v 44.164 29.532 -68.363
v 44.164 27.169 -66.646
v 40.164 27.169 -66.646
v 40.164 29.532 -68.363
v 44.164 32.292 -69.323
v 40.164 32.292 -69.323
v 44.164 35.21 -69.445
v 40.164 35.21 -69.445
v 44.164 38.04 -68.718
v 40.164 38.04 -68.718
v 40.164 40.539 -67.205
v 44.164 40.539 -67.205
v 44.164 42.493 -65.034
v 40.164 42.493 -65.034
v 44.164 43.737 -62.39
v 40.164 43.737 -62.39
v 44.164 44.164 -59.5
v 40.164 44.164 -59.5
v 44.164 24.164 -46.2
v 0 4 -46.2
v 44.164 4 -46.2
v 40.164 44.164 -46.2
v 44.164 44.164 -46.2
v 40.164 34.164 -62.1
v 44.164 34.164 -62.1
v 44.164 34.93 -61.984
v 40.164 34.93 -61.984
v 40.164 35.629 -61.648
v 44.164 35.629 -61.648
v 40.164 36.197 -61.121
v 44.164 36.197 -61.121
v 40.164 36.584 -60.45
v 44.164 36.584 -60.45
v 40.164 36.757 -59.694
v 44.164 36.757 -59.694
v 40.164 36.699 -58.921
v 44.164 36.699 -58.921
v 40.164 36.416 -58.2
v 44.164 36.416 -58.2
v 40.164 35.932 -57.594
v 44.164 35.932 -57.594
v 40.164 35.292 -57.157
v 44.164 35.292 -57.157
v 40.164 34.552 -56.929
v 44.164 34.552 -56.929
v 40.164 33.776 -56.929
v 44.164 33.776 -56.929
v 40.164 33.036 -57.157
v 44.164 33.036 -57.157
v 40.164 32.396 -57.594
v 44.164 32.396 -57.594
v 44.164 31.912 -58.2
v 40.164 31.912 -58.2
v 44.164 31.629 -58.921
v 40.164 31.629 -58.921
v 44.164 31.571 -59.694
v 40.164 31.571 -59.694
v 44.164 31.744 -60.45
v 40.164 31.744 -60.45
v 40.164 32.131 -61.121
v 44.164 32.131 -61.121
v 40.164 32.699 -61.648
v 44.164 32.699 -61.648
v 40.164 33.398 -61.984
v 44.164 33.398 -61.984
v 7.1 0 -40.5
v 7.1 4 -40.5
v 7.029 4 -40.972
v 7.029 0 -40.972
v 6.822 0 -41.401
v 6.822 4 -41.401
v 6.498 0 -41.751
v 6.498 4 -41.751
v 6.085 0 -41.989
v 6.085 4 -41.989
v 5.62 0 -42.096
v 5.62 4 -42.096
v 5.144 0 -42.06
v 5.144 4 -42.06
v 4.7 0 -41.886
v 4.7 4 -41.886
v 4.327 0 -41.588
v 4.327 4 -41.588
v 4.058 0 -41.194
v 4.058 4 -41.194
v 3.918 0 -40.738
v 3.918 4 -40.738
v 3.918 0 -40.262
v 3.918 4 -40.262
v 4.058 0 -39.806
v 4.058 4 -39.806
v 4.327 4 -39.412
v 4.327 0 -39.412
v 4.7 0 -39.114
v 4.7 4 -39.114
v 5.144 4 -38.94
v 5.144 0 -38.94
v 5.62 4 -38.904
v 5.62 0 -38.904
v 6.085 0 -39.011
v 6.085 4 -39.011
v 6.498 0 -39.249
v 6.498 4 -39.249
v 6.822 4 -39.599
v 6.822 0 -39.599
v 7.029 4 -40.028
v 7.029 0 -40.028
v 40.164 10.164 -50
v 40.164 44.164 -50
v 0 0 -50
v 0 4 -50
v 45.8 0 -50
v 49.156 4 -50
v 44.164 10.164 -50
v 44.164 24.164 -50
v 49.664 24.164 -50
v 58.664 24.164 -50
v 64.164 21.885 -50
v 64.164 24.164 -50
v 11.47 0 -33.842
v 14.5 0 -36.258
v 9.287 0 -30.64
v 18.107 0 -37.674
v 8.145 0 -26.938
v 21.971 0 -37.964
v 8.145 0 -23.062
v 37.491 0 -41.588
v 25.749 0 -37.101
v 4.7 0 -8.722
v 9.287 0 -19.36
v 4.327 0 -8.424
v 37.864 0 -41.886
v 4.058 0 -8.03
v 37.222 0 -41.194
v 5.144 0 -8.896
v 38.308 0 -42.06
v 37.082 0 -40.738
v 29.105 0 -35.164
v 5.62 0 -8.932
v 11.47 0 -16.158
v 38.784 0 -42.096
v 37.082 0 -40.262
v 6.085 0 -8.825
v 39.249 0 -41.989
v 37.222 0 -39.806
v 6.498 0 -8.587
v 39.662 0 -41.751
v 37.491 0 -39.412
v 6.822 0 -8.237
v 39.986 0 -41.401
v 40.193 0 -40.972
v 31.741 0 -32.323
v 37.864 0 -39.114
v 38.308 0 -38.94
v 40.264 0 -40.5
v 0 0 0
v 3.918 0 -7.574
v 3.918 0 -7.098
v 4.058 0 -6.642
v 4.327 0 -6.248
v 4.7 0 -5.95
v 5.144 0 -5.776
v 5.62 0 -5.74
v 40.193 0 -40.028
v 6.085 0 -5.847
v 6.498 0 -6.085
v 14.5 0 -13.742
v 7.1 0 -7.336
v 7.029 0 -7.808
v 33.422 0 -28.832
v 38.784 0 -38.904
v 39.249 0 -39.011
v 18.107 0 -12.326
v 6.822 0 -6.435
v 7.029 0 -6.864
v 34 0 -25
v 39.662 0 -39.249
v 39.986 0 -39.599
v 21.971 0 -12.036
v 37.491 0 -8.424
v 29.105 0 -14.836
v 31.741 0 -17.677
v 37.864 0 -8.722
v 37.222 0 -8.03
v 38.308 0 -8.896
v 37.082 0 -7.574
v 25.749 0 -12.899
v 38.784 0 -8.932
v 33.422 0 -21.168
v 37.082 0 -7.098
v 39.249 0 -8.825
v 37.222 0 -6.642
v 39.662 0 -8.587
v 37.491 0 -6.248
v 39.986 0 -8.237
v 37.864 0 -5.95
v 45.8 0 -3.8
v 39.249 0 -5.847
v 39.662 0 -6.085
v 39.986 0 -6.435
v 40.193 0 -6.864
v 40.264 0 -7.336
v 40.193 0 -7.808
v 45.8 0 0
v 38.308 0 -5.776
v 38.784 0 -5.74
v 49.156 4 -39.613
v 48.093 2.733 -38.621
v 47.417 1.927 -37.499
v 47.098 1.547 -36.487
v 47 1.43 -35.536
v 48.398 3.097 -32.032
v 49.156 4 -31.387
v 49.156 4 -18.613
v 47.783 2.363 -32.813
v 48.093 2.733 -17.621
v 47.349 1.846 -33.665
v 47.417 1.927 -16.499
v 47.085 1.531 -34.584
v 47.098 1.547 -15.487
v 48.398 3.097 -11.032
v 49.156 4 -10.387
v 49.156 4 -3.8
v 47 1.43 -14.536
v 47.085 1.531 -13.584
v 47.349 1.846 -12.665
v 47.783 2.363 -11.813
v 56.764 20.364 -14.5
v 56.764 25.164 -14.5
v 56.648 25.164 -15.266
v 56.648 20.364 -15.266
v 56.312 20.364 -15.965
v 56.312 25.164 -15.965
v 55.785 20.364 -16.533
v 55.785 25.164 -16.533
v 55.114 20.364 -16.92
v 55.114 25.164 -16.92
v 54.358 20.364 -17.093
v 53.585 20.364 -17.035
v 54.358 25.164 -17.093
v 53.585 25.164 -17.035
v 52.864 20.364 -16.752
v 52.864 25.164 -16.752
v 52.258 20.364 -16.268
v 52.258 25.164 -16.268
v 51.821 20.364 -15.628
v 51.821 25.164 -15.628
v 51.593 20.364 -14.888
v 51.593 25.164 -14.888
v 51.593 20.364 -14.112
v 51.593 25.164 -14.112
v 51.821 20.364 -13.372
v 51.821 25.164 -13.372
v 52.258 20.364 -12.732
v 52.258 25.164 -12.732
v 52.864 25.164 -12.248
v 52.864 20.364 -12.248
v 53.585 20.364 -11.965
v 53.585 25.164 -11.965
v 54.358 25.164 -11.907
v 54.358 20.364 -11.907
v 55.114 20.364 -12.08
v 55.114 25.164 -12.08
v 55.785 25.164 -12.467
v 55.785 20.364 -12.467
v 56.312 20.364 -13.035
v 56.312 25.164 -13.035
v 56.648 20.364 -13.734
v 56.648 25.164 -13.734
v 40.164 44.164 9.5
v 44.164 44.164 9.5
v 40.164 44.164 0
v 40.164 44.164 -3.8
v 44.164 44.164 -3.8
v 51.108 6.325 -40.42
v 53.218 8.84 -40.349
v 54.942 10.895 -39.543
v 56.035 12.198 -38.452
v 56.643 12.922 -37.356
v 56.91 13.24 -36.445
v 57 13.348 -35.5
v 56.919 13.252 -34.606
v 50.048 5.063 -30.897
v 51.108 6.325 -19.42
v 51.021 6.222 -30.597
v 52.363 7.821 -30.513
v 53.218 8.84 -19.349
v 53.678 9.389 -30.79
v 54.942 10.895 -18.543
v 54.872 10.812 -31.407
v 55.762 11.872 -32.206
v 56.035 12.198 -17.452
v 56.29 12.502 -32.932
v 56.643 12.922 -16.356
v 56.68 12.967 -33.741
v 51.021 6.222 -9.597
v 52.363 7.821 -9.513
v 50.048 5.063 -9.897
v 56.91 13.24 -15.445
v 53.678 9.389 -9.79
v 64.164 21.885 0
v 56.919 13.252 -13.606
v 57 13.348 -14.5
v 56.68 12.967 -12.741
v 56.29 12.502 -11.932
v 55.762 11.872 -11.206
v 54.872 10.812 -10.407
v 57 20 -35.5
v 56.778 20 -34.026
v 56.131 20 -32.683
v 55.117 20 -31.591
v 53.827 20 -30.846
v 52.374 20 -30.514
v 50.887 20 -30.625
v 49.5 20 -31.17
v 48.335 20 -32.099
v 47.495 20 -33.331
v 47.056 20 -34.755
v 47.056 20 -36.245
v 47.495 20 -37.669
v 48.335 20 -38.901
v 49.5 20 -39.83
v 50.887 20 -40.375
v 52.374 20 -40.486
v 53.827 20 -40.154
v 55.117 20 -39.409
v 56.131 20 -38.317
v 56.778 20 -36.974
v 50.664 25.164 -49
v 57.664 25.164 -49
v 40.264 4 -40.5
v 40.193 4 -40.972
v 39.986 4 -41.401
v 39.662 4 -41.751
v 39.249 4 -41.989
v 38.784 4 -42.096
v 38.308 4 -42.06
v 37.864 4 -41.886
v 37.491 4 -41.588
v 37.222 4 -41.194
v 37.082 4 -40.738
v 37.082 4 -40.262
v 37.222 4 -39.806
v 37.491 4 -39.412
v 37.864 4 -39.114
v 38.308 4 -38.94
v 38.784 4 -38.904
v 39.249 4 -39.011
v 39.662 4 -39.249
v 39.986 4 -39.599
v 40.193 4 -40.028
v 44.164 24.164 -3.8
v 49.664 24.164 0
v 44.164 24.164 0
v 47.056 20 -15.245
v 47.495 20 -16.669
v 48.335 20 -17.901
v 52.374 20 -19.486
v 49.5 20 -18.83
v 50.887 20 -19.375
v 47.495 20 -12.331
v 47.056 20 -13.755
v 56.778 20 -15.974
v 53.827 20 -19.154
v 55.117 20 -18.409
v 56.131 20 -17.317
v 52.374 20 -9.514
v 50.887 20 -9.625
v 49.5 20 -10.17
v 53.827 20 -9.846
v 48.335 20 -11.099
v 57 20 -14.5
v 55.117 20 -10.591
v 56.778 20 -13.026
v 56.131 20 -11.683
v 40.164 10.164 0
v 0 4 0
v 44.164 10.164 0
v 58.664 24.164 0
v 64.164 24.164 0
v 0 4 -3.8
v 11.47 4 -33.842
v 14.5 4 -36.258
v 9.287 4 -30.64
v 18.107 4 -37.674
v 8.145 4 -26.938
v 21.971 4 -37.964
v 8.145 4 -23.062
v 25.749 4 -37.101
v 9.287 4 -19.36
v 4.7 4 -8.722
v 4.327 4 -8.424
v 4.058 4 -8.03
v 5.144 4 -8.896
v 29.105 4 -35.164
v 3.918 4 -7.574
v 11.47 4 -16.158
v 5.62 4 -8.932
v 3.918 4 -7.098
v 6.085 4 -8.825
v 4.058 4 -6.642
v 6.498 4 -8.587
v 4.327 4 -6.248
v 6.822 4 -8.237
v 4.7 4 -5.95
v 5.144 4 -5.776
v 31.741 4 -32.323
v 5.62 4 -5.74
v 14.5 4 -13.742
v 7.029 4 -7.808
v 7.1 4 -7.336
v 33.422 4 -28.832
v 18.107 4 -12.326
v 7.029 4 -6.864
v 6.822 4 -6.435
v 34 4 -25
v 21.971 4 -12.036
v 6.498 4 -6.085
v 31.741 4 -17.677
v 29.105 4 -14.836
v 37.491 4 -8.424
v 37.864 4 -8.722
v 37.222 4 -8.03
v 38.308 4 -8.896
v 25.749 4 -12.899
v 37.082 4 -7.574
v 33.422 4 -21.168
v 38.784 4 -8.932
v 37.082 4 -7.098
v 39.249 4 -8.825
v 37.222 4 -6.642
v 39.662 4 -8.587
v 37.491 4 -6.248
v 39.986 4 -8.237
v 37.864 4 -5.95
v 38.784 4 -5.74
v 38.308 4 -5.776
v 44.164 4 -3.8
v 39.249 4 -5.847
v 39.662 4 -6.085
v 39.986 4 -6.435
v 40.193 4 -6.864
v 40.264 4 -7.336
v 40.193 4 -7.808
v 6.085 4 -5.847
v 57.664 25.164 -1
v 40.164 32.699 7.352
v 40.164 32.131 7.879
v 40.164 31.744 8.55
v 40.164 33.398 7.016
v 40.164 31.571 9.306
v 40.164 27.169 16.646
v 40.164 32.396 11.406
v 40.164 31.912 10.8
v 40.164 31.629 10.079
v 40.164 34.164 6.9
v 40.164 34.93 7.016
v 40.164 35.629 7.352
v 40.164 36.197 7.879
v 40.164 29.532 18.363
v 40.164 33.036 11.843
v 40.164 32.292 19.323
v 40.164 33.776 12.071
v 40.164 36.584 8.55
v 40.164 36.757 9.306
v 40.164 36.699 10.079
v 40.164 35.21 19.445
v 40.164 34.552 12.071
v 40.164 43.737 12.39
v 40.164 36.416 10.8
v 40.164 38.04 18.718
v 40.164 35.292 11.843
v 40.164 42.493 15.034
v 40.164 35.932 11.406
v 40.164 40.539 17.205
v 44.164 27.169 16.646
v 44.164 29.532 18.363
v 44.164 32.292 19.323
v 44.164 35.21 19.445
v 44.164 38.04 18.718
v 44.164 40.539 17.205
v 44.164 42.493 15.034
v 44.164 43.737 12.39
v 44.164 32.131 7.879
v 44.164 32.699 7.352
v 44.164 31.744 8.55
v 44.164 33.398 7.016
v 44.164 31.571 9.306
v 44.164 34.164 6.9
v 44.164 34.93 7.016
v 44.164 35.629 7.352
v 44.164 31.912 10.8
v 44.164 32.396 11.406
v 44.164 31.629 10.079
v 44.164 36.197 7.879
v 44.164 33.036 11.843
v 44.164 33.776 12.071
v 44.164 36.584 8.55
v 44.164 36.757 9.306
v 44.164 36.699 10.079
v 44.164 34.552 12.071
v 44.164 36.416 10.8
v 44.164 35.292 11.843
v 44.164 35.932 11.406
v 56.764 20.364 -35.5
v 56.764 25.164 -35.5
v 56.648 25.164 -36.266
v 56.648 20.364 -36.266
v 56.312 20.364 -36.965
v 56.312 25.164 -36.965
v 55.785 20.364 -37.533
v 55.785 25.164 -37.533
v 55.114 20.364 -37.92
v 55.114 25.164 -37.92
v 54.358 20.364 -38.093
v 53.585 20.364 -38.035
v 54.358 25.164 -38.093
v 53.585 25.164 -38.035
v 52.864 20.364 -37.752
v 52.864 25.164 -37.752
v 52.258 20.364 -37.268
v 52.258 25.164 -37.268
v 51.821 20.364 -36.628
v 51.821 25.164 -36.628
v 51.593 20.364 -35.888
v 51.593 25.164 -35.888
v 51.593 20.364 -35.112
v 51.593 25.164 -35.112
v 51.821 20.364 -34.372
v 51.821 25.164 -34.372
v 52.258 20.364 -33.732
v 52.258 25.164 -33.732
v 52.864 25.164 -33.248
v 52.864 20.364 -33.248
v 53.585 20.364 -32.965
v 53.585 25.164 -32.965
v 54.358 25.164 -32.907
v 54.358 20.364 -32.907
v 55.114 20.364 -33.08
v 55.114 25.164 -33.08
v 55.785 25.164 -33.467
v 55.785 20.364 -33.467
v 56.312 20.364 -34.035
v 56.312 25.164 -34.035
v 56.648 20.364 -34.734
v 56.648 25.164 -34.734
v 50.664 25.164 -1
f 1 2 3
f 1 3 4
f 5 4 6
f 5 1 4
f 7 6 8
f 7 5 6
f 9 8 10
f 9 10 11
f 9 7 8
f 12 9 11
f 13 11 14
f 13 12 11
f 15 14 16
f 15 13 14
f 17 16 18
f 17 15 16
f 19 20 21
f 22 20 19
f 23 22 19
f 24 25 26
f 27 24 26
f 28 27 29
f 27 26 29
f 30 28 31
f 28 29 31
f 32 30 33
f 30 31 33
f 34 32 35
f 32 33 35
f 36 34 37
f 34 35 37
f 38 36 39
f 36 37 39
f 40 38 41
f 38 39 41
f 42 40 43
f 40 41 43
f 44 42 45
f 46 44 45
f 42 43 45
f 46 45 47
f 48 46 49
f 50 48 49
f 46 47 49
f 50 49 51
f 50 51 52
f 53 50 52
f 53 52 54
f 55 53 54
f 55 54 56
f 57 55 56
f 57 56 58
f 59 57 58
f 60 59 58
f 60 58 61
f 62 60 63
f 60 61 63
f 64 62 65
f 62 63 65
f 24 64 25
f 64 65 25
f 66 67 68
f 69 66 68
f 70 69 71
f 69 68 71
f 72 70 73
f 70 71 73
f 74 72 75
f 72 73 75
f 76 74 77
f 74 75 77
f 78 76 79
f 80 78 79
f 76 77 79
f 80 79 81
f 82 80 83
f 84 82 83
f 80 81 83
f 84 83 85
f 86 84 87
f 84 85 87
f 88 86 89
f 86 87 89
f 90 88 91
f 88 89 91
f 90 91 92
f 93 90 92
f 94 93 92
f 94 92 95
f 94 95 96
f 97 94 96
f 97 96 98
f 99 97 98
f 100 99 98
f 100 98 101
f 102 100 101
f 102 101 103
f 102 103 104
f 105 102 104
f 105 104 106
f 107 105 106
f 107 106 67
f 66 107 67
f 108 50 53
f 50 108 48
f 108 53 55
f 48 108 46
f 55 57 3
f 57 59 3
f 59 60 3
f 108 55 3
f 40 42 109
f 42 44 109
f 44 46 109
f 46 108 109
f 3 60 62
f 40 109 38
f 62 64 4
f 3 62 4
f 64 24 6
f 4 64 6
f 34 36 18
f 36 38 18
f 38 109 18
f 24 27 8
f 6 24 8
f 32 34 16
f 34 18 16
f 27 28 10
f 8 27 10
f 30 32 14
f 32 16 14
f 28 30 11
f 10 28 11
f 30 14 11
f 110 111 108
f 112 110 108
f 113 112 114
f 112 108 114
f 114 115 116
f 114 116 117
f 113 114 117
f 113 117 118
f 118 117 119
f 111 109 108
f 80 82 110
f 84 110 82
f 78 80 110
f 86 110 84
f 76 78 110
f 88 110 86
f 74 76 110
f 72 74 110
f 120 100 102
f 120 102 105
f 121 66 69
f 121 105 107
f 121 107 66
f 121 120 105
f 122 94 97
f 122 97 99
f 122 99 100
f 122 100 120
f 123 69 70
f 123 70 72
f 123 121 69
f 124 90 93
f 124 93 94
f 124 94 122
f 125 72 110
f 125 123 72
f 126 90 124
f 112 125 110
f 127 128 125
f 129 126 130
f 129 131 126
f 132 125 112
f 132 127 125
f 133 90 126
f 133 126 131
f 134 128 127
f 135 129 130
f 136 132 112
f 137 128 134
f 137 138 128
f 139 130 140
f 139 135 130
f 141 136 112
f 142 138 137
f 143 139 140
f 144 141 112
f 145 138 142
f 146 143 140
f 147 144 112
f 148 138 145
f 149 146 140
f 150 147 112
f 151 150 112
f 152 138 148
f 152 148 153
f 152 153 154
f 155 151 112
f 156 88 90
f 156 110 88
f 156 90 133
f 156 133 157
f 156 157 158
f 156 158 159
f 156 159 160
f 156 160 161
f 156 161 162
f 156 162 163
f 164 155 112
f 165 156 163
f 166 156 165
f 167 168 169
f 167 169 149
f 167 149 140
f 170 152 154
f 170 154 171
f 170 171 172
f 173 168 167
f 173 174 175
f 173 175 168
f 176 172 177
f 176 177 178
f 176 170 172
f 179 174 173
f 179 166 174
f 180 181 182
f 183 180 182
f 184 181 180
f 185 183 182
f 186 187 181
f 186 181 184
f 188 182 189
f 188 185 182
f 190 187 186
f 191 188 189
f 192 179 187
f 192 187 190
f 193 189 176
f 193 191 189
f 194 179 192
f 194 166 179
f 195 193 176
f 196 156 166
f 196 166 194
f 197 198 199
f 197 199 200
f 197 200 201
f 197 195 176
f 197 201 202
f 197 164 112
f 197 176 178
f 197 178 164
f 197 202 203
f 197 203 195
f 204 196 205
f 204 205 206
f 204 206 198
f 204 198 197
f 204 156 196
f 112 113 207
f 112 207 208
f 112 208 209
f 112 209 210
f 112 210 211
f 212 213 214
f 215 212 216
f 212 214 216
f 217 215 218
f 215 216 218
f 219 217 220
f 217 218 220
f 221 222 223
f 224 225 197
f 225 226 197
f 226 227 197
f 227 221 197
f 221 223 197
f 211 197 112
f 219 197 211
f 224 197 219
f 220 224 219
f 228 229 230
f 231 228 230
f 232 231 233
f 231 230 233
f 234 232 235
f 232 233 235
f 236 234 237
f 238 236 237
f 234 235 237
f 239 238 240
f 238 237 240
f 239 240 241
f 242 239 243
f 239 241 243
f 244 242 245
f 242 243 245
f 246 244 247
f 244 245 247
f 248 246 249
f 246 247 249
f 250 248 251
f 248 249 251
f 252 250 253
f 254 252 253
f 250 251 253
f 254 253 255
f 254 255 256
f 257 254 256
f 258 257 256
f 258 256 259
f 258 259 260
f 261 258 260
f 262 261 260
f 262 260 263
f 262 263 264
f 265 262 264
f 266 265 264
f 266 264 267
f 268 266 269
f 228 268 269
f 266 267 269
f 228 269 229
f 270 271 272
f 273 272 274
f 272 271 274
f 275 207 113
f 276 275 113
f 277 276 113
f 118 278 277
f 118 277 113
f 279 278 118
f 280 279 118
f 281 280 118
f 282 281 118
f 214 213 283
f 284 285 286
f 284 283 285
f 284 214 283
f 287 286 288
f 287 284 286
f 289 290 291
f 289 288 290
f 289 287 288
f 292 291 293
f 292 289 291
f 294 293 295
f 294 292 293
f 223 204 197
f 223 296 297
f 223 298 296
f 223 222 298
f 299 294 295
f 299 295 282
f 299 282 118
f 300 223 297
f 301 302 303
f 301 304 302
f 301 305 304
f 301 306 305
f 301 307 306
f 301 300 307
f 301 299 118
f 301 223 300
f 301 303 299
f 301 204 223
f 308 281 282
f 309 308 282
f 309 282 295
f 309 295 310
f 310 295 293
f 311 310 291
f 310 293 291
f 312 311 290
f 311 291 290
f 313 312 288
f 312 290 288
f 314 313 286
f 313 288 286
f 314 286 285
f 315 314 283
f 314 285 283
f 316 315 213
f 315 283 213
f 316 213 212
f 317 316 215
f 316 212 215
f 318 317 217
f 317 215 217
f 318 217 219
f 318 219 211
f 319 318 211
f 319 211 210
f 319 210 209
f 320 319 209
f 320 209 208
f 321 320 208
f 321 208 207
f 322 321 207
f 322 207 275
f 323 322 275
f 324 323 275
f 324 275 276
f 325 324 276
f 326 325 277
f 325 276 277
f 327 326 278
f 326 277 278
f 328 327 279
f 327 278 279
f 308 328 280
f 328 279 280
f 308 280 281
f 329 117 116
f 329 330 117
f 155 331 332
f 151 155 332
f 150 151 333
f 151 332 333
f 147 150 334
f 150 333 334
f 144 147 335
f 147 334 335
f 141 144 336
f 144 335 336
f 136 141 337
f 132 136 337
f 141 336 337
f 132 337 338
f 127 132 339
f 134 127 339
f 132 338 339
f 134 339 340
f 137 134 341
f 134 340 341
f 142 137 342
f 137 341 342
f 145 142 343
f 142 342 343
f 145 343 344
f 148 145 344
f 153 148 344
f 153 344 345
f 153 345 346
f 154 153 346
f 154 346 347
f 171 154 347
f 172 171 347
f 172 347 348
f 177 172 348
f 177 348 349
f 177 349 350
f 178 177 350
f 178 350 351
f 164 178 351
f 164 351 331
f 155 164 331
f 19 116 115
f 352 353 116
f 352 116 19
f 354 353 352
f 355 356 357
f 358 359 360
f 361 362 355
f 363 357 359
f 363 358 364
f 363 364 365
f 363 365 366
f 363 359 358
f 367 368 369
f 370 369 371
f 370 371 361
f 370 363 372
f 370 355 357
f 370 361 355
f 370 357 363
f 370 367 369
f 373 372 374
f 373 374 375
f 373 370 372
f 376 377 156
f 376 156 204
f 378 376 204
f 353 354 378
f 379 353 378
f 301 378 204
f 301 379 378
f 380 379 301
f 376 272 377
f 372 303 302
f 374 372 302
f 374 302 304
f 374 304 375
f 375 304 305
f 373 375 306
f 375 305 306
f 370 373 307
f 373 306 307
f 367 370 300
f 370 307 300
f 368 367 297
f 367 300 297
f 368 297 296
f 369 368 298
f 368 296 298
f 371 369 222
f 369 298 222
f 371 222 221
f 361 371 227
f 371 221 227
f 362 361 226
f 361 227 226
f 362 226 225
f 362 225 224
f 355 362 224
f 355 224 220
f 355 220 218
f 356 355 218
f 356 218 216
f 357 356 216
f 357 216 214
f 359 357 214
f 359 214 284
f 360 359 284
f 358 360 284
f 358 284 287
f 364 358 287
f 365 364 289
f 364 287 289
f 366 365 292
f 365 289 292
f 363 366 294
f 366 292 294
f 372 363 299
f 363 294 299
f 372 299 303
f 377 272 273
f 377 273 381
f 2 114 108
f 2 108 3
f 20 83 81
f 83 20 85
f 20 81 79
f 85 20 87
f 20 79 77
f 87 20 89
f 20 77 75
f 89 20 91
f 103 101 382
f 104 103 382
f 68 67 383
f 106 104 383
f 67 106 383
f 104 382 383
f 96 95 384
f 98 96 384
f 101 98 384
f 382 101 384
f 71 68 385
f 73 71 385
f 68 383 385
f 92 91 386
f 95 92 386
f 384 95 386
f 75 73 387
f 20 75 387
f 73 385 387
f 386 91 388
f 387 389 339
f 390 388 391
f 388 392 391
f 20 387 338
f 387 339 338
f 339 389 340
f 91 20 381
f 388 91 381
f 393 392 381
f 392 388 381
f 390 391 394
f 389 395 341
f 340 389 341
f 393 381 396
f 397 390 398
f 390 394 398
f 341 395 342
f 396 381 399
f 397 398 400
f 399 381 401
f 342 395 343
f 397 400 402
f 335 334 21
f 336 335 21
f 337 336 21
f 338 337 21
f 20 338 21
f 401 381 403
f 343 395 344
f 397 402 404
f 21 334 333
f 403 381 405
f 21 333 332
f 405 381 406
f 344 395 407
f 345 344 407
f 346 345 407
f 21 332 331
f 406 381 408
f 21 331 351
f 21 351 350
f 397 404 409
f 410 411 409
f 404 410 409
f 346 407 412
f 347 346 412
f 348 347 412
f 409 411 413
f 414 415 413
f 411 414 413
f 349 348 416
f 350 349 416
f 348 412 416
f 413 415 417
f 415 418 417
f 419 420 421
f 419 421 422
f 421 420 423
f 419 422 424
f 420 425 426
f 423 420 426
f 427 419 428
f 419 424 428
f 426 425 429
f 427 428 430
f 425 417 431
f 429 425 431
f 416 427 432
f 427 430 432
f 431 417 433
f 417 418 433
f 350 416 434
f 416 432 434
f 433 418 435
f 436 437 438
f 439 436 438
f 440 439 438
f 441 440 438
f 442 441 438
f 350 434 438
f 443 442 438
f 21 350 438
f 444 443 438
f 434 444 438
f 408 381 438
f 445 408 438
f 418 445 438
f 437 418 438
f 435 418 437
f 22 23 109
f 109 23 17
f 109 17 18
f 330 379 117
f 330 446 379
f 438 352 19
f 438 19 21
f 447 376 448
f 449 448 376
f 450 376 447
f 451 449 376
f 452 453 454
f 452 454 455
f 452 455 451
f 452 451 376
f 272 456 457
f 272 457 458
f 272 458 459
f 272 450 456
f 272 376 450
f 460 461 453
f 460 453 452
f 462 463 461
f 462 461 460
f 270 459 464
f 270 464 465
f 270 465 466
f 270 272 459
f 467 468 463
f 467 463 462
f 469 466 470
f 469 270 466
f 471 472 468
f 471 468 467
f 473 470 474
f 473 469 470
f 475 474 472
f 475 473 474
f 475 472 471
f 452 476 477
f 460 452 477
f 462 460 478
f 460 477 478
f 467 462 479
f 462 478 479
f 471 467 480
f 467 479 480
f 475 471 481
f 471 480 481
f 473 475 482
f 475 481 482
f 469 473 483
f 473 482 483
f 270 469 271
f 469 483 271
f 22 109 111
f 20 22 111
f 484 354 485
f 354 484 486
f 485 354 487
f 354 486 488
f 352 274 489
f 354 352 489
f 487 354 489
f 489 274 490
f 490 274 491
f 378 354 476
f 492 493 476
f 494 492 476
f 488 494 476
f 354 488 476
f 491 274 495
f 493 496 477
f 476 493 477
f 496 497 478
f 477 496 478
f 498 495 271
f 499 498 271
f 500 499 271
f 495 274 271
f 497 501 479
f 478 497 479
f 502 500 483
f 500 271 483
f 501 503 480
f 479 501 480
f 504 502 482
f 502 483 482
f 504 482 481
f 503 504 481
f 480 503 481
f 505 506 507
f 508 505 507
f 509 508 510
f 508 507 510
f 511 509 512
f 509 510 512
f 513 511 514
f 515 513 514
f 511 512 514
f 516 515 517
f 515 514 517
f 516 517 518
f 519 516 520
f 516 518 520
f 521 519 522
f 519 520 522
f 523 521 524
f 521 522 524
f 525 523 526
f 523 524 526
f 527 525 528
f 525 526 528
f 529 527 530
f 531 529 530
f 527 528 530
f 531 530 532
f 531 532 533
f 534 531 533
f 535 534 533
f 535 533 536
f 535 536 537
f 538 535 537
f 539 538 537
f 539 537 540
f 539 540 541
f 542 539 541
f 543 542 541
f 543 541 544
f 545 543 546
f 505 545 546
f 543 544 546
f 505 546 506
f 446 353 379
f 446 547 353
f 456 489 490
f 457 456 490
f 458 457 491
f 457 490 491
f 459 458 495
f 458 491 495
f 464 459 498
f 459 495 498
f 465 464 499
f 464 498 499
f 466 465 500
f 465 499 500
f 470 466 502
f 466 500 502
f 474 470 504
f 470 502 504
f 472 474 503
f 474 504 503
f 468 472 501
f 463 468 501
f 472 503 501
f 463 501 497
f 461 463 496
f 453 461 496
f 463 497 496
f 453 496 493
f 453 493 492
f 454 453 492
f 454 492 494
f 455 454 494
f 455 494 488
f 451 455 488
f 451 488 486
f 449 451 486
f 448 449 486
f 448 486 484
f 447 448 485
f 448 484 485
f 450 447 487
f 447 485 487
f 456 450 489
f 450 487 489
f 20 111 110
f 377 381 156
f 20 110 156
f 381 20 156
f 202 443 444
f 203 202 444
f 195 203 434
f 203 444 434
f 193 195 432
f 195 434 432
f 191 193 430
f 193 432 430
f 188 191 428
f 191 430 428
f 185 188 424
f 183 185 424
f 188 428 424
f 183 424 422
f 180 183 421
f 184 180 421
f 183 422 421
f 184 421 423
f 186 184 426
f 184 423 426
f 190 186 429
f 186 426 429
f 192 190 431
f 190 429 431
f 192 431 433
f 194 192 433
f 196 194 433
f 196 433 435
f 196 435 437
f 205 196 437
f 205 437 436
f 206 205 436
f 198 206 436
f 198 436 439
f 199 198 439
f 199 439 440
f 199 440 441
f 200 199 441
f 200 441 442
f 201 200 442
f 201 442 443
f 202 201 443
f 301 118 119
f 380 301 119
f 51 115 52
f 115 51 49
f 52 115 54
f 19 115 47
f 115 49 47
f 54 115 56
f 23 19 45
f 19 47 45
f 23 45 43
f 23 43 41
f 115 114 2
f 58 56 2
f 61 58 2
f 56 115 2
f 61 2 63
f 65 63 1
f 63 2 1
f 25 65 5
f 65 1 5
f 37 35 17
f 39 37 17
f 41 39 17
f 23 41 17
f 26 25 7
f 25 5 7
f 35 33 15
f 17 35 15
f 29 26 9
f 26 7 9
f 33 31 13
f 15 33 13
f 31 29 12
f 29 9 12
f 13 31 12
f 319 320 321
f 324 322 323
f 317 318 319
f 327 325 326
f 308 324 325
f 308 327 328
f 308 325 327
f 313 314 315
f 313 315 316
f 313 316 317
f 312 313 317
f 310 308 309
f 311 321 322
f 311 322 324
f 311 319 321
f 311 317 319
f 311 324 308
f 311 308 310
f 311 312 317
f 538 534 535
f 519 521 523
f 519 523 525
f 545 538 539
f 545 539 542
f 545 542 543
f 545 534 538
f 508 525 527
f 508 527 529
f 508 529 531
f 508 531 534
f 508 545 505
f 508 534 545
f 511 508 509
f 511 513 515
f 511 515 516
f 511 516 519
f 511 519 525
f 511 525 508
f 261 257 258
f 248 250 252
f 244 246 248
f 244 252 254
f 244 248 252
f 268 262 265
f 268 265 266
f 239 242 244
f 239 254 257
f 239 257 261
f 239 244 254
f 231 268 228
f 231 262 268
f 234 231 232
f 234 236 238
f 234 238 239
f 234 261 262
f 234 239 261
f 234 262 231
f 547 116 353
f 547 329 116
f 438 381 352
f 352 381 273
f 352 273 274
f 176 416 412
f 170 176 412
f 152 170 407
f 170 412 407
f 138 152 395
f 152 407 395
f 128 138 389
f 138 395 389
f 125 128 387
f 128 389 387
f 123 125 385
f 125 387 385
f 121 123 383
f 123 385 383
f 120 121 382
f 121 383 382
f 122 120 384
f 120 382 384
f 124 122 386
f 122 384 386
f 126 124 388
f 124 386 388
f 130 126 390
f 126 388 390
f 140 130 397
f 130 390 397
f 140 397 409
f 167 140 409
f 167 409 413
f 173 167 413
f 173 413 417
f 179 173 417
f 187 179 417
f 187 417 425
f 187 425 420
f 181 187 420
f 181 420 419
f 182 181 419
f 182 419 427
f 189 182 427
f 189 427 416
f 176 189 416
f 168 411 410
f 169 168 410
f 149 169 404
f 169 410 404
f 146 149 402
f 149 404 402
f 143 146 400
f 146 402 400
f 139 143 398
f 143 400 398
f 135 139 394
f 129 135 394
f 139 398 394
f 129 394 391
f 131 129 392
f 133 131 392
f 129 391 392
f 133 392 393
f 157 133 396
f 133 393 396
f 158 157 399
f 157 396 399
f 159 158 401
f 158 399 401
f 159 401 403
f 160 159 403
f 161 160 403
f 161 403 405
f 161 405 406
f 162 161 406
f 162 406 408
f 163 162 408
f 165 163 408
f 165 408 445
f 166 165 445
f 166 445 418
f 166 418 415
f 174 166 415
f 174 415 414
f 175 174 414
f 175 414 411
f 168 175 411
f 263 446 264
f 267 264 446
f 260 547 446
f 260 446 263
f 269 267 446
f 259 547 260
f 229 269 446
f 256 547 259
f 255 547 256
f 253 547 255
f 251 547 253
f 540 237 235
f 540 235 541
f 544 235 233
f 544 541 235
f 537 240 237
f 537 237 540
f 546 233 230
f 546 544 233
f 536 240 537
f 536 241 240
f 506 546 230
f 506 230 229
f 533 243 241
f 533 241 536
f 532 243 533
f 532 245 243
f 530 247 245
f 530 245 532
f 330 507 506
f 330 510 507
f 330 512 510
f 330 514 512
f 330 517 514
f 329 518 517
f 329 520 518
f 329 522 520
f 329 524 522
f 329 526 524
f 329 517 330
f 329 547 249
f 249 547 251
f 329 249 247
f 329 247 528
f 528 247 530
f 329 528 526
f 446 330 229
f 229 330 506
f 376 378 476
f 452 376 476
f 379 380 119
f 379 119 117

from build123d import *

# Parameters (mm, degrees)
BOSS_EXTRUDE1_DEPTH = 3.8
SKETCH2_W           = 45.8
SKETCH2_H           = 50
BOSS_EXTRUDE2_DEPTH = 4
BOSS_EXTRUDE3_DEPTH = 46.2
BOSS_EXTRUDE4_DEPTH = 3.8
BOSS_EXTRUDE5_REACH = 52
SKETCH6_W           = 9
SKETCH6_H           = 50
BOSS_EXTRUDE6_DEPTH = 1
BOSS_EXTRUDE6_TAPER = 45
SKETCH7_R           = 2.6
BOSS_EXTRUDE7_DEPTH = 4
CUT_EXTRUDE1_REACH  = 6
SKETCH8_R           = 13
SKETCH8_R_2         = 1.6
SKETCH9_R           = 2.6
CUT_EXTRUDE2_DEPTH  = 4.8
SKETCH10_R          = 5
CUT_EXTRUDE3_DEPTH  = 20


with BuildPart() as part:
    # Sketch1 → Boss-Extrude1 (new body)
    with BuildSketch(Plane.XY):
        Polygon((0, 0), (45.8, 0), (64.164, 21.885362974), (64.164, 24.164), (44.164, 24.164), (44.164, 44.164), (40.164, 44.164), (0, 4), align=None)
    extrude(amount=-BOSS_EXTRUDE1_DEPTH)

    # Sketch2 → Boss-Extrude2 (add)
    with BuildSketch(Plane.XZ):
        with Locations((22.9, -25)):
            Rectangle(SKETCH2_W, SKETCH2_H)
    extrude(amount=-BOSS_EXTRUDE2_DEPTH)

    # Sketch3 → Boss-Extrude3 (add, through all)
    with BuildSketch(Plane(origin=(0, 0, -3.8), x_dir=(-1, 0, 0), z_dir=(0, 0, -1))):
        Polygon((-45.8, 0), (-45.8, 4), (-49.156398525, 4), align=None)
    extrude(amount=BOSS_EXTRUDE3_DEPTH)

    # Sketch4 → Boss-Extrude4 (add)
    with BuildSketch(Plane(origin=(0, 0, -50), x_dir=(-1, 0, 0), z_dir=(0, 0, -1))):
        Polygon((-44.164, 24.164), (-44.164, 44.164), (-40.164, 44.164), (0, 4), (0, 0), (-45.8, 0), (-64.164, 21.885362974), (-64.164, 24.164), align=None)
    extrude(amount=-BOSS_EXTRUDE4_DEPTH)

    # Sketch5 → Boss-Extrude5 (add, up to next)
    with BuildSketch(Plane.XY, mode=Mode.PRIVATE) as boss_extrude5_sk1:
        Polygon((44.164, 24.164), (44.164, 0), (45.8, 0), (64.164, 21.885362974), (64.164, 24.164), align=None)
    boss_extrude5_tool1 = extrude(boss_extrude5_sk1.sketch, amount=-BOSS_EXTRUDE5_REACH, mode=Mode.PRIVATE) - part.part
    add(boss_extrude5_tool1.solids().sort_by_distance((51.403304, 15.489129, 0))[0])

    # Sketch6 → Boss-Extrude6 (add)
    with BuildSketch(Plane(origin=(0, 24.164, 0), x_dir=(1, 0, 0), z_dir=(0, 1, 0))):
        with Locations((54.164, 25)):
            Rectangle(SKETCH6_W, SKETCH6_H)
    extrude(amount=BOSS_EXTRUDE6_DEPTH, taper=BOSS_EXTRUDE6_TAPER)

    # Sketch7 → Boss-Extrude7 (add)
    with BuildSketch(Plane(origin=(44.164, 0, 0), x_dir=(0, 0, -1), z_dir=(1, 0, 0))):
        with BuildLine():
            Line((0, 24.164), (0, 10.164))
            Line((0, 10.164), (-16.646029173, 27.168696786))
            ThreePointArc((-16.646029173, 27.168696786), (-18.718270774, 38.040013923), (-9.5, 44.164))
            Line((-9.5, 44.164), (3.8, 44.164))
            Line((3.8, 44.164), (3.8, 24.164))
            Line((3.8, 24.164), (0, 24.164))
        make_face()
        with Locations((-9.5, 34.164)):
            Circle(SKETCH7_R, mode=Mode.SUBTRACT)
        with BuildLine():
            Line((46.2, 44.164), (46.2, 24.164))
            Line((46.2, 24.164), (50, 24.164))
            Line((50, 24.164), (50, 10.164))
            Line((50, 10.164), (66.646029173, 27.168696786))
            ThreePointArc((66.646029173, 27.168696786), (68.718270774, 38.040013923), (59.5, 44.164))
            Line((59.5, 44.164), (46.2, 44.164))
        make_face()
        with Locations((59.5, 34.164)):
            Circle(SKETCH7_R, mode=Mode.SUBTRACT)
    extrude(amount=-BOSS_EXTRUDE7_DEPTH)

    # Sketch8 → Cut-Extrude1 (cut, up to next)
    with BuildSketch(Plane(origin=(0, 4, 0), x_dir=(1, 0, 0), z_dir=(0, 1, 0)), mode=Mode.PRIVATE) as cut_extrude1_sk1:
        with Locations((21, 25)):
            Circle(SKETCH8_R)
    cut_extrude1_tool1 = extrude(cut_extrude1_sk1.sketch, amount=-CUT_EXTRUDE1_REACH, mode=Mode.PRIVATE) & part.part
    add(cut_extrude1_tool1.solids().sort_by_distance((21, 4, -25))[0], mode=Mode.SUBTRACT)
    # Sketch8 → Cut-Extrude1 (cut, up to next)
    with BuildSketch(Plane(origin=(0, 4, 0), x_dir=(1, 0, 0), z_dir=(0, 1, 0)), mode=Mode.PRIVATE) as cut_extrude1_sk2:
        with Locations((5.5, 40.5)):
            Circle(SKETCH8_R_2)
    cut_extrude1_tool2 = extrude(cut_extrude1_sk2.sketch, amount=-CUT_EXTRUDE1_REACH, mode=Mode.PRIVATE) & part.part
    add(cut_extrude1_tool2.solids().sort_by_distance((5.5, 4, -40.5))[0], mode=Mode.SUBTRACT)
    # Sketch8 → Cut-Extrude1 (cut, up to next)
    with BuildSketch(Plane(origin=(0, 4, 0), x_dir=(1, 0, 0), z_dir=(0, 1, 0)), mode=Mode.PRIVATE) as cut_extrude1_sk3:
        with Locations((38.664, 40.5)):
            Circle(SKETCH8_R_2)
    cut_extrude1_tool3 = extrude(cut_extrude1_sk3.sketch, amount=-CUT_EXTRUDE1_REACH, mode=Mode.PRIVATE) & part.part
    add(cut_extrude1_tool3.solids().sort_by_distance((38.664, 4, -40.5))[0], mode=Mode.SUBTRACT)
    # Sketch8 → Cut-Extrude1 (cut, up to next)
    with BuildSketch(Plane(origin=(0, 4, 0), x_dir=(1, 0, 0), z_dir=(0, 1, 0)), mode=Mode.PRIVATE) as cut_extrude1_sk4:
        with Locations((38.664, 7.336)):
            Circle(SKETCH8_R_2)
    cut_extrude1_tool4 = extrude(cut_extrude1_sk4.sketch, amount=-CUT_EXTRUDE1_REACH, mode=Mode.PRIVATE) & part.part
    add(cut_extrude1_tool4.solids().sort_by_distance((38.664, 4, -7.336))[0], mode=Mode.SUBTRACT)
    # Sketch8 → Cut-Extrude1 (cut, up to next)
    with BuildSketch(Plane(origin=(0, 4, 0), x_dir=(1, 0, 0), z_dir=(0, 1, 0)), mode=Mode.PRIVATE) as cut_extrude1_sk5:
        with Locations((5.5, 7.336)):
            Circle(SKETCH8_R_2)
    cut_extrude1_tool5 = extrude(cut_extrude1_sk5.sketch, amount=-CUT_EXTRUDE1_REACH, mode=Mode.PRIVATE) & part.part
    add(cut_extrude1_tool5.solids().sort_by_distance((5.5, 4, -7.336))[0], mode=Mode.SUBTRACT)

    # Sketch9 → Cut-Extrude2 (cut)
    with BuildSketch(Plane(origin=(0, 25.164, 0), x_dir=(1, 0, 0), z_dir=(0, 1, 0))):
        with Locations((54.164, 14.5)):
            Circle(SKETCH9_R)
        with Locations((54.164, 35.5)):
            Circle(SKETCH9_R)
    extrude(amount=-CUT_EXTRUDE2_DEPTH, mode=Mode.SUBTRACT)

    # Sketch10 → Cut-Extrude3 (cut)
    with BuildSketch(Plane.XZ):
        with Locations((52, -14.5)):
            Circle(SKETCH10_R)
        with Locations((52, -35.5)):
            Circle(SKETCH10_R)
    extrude(amount=-CUT_EXTRUDE3_DEPTH, mode=Mode.SUBTRACT)


solid = part.part
